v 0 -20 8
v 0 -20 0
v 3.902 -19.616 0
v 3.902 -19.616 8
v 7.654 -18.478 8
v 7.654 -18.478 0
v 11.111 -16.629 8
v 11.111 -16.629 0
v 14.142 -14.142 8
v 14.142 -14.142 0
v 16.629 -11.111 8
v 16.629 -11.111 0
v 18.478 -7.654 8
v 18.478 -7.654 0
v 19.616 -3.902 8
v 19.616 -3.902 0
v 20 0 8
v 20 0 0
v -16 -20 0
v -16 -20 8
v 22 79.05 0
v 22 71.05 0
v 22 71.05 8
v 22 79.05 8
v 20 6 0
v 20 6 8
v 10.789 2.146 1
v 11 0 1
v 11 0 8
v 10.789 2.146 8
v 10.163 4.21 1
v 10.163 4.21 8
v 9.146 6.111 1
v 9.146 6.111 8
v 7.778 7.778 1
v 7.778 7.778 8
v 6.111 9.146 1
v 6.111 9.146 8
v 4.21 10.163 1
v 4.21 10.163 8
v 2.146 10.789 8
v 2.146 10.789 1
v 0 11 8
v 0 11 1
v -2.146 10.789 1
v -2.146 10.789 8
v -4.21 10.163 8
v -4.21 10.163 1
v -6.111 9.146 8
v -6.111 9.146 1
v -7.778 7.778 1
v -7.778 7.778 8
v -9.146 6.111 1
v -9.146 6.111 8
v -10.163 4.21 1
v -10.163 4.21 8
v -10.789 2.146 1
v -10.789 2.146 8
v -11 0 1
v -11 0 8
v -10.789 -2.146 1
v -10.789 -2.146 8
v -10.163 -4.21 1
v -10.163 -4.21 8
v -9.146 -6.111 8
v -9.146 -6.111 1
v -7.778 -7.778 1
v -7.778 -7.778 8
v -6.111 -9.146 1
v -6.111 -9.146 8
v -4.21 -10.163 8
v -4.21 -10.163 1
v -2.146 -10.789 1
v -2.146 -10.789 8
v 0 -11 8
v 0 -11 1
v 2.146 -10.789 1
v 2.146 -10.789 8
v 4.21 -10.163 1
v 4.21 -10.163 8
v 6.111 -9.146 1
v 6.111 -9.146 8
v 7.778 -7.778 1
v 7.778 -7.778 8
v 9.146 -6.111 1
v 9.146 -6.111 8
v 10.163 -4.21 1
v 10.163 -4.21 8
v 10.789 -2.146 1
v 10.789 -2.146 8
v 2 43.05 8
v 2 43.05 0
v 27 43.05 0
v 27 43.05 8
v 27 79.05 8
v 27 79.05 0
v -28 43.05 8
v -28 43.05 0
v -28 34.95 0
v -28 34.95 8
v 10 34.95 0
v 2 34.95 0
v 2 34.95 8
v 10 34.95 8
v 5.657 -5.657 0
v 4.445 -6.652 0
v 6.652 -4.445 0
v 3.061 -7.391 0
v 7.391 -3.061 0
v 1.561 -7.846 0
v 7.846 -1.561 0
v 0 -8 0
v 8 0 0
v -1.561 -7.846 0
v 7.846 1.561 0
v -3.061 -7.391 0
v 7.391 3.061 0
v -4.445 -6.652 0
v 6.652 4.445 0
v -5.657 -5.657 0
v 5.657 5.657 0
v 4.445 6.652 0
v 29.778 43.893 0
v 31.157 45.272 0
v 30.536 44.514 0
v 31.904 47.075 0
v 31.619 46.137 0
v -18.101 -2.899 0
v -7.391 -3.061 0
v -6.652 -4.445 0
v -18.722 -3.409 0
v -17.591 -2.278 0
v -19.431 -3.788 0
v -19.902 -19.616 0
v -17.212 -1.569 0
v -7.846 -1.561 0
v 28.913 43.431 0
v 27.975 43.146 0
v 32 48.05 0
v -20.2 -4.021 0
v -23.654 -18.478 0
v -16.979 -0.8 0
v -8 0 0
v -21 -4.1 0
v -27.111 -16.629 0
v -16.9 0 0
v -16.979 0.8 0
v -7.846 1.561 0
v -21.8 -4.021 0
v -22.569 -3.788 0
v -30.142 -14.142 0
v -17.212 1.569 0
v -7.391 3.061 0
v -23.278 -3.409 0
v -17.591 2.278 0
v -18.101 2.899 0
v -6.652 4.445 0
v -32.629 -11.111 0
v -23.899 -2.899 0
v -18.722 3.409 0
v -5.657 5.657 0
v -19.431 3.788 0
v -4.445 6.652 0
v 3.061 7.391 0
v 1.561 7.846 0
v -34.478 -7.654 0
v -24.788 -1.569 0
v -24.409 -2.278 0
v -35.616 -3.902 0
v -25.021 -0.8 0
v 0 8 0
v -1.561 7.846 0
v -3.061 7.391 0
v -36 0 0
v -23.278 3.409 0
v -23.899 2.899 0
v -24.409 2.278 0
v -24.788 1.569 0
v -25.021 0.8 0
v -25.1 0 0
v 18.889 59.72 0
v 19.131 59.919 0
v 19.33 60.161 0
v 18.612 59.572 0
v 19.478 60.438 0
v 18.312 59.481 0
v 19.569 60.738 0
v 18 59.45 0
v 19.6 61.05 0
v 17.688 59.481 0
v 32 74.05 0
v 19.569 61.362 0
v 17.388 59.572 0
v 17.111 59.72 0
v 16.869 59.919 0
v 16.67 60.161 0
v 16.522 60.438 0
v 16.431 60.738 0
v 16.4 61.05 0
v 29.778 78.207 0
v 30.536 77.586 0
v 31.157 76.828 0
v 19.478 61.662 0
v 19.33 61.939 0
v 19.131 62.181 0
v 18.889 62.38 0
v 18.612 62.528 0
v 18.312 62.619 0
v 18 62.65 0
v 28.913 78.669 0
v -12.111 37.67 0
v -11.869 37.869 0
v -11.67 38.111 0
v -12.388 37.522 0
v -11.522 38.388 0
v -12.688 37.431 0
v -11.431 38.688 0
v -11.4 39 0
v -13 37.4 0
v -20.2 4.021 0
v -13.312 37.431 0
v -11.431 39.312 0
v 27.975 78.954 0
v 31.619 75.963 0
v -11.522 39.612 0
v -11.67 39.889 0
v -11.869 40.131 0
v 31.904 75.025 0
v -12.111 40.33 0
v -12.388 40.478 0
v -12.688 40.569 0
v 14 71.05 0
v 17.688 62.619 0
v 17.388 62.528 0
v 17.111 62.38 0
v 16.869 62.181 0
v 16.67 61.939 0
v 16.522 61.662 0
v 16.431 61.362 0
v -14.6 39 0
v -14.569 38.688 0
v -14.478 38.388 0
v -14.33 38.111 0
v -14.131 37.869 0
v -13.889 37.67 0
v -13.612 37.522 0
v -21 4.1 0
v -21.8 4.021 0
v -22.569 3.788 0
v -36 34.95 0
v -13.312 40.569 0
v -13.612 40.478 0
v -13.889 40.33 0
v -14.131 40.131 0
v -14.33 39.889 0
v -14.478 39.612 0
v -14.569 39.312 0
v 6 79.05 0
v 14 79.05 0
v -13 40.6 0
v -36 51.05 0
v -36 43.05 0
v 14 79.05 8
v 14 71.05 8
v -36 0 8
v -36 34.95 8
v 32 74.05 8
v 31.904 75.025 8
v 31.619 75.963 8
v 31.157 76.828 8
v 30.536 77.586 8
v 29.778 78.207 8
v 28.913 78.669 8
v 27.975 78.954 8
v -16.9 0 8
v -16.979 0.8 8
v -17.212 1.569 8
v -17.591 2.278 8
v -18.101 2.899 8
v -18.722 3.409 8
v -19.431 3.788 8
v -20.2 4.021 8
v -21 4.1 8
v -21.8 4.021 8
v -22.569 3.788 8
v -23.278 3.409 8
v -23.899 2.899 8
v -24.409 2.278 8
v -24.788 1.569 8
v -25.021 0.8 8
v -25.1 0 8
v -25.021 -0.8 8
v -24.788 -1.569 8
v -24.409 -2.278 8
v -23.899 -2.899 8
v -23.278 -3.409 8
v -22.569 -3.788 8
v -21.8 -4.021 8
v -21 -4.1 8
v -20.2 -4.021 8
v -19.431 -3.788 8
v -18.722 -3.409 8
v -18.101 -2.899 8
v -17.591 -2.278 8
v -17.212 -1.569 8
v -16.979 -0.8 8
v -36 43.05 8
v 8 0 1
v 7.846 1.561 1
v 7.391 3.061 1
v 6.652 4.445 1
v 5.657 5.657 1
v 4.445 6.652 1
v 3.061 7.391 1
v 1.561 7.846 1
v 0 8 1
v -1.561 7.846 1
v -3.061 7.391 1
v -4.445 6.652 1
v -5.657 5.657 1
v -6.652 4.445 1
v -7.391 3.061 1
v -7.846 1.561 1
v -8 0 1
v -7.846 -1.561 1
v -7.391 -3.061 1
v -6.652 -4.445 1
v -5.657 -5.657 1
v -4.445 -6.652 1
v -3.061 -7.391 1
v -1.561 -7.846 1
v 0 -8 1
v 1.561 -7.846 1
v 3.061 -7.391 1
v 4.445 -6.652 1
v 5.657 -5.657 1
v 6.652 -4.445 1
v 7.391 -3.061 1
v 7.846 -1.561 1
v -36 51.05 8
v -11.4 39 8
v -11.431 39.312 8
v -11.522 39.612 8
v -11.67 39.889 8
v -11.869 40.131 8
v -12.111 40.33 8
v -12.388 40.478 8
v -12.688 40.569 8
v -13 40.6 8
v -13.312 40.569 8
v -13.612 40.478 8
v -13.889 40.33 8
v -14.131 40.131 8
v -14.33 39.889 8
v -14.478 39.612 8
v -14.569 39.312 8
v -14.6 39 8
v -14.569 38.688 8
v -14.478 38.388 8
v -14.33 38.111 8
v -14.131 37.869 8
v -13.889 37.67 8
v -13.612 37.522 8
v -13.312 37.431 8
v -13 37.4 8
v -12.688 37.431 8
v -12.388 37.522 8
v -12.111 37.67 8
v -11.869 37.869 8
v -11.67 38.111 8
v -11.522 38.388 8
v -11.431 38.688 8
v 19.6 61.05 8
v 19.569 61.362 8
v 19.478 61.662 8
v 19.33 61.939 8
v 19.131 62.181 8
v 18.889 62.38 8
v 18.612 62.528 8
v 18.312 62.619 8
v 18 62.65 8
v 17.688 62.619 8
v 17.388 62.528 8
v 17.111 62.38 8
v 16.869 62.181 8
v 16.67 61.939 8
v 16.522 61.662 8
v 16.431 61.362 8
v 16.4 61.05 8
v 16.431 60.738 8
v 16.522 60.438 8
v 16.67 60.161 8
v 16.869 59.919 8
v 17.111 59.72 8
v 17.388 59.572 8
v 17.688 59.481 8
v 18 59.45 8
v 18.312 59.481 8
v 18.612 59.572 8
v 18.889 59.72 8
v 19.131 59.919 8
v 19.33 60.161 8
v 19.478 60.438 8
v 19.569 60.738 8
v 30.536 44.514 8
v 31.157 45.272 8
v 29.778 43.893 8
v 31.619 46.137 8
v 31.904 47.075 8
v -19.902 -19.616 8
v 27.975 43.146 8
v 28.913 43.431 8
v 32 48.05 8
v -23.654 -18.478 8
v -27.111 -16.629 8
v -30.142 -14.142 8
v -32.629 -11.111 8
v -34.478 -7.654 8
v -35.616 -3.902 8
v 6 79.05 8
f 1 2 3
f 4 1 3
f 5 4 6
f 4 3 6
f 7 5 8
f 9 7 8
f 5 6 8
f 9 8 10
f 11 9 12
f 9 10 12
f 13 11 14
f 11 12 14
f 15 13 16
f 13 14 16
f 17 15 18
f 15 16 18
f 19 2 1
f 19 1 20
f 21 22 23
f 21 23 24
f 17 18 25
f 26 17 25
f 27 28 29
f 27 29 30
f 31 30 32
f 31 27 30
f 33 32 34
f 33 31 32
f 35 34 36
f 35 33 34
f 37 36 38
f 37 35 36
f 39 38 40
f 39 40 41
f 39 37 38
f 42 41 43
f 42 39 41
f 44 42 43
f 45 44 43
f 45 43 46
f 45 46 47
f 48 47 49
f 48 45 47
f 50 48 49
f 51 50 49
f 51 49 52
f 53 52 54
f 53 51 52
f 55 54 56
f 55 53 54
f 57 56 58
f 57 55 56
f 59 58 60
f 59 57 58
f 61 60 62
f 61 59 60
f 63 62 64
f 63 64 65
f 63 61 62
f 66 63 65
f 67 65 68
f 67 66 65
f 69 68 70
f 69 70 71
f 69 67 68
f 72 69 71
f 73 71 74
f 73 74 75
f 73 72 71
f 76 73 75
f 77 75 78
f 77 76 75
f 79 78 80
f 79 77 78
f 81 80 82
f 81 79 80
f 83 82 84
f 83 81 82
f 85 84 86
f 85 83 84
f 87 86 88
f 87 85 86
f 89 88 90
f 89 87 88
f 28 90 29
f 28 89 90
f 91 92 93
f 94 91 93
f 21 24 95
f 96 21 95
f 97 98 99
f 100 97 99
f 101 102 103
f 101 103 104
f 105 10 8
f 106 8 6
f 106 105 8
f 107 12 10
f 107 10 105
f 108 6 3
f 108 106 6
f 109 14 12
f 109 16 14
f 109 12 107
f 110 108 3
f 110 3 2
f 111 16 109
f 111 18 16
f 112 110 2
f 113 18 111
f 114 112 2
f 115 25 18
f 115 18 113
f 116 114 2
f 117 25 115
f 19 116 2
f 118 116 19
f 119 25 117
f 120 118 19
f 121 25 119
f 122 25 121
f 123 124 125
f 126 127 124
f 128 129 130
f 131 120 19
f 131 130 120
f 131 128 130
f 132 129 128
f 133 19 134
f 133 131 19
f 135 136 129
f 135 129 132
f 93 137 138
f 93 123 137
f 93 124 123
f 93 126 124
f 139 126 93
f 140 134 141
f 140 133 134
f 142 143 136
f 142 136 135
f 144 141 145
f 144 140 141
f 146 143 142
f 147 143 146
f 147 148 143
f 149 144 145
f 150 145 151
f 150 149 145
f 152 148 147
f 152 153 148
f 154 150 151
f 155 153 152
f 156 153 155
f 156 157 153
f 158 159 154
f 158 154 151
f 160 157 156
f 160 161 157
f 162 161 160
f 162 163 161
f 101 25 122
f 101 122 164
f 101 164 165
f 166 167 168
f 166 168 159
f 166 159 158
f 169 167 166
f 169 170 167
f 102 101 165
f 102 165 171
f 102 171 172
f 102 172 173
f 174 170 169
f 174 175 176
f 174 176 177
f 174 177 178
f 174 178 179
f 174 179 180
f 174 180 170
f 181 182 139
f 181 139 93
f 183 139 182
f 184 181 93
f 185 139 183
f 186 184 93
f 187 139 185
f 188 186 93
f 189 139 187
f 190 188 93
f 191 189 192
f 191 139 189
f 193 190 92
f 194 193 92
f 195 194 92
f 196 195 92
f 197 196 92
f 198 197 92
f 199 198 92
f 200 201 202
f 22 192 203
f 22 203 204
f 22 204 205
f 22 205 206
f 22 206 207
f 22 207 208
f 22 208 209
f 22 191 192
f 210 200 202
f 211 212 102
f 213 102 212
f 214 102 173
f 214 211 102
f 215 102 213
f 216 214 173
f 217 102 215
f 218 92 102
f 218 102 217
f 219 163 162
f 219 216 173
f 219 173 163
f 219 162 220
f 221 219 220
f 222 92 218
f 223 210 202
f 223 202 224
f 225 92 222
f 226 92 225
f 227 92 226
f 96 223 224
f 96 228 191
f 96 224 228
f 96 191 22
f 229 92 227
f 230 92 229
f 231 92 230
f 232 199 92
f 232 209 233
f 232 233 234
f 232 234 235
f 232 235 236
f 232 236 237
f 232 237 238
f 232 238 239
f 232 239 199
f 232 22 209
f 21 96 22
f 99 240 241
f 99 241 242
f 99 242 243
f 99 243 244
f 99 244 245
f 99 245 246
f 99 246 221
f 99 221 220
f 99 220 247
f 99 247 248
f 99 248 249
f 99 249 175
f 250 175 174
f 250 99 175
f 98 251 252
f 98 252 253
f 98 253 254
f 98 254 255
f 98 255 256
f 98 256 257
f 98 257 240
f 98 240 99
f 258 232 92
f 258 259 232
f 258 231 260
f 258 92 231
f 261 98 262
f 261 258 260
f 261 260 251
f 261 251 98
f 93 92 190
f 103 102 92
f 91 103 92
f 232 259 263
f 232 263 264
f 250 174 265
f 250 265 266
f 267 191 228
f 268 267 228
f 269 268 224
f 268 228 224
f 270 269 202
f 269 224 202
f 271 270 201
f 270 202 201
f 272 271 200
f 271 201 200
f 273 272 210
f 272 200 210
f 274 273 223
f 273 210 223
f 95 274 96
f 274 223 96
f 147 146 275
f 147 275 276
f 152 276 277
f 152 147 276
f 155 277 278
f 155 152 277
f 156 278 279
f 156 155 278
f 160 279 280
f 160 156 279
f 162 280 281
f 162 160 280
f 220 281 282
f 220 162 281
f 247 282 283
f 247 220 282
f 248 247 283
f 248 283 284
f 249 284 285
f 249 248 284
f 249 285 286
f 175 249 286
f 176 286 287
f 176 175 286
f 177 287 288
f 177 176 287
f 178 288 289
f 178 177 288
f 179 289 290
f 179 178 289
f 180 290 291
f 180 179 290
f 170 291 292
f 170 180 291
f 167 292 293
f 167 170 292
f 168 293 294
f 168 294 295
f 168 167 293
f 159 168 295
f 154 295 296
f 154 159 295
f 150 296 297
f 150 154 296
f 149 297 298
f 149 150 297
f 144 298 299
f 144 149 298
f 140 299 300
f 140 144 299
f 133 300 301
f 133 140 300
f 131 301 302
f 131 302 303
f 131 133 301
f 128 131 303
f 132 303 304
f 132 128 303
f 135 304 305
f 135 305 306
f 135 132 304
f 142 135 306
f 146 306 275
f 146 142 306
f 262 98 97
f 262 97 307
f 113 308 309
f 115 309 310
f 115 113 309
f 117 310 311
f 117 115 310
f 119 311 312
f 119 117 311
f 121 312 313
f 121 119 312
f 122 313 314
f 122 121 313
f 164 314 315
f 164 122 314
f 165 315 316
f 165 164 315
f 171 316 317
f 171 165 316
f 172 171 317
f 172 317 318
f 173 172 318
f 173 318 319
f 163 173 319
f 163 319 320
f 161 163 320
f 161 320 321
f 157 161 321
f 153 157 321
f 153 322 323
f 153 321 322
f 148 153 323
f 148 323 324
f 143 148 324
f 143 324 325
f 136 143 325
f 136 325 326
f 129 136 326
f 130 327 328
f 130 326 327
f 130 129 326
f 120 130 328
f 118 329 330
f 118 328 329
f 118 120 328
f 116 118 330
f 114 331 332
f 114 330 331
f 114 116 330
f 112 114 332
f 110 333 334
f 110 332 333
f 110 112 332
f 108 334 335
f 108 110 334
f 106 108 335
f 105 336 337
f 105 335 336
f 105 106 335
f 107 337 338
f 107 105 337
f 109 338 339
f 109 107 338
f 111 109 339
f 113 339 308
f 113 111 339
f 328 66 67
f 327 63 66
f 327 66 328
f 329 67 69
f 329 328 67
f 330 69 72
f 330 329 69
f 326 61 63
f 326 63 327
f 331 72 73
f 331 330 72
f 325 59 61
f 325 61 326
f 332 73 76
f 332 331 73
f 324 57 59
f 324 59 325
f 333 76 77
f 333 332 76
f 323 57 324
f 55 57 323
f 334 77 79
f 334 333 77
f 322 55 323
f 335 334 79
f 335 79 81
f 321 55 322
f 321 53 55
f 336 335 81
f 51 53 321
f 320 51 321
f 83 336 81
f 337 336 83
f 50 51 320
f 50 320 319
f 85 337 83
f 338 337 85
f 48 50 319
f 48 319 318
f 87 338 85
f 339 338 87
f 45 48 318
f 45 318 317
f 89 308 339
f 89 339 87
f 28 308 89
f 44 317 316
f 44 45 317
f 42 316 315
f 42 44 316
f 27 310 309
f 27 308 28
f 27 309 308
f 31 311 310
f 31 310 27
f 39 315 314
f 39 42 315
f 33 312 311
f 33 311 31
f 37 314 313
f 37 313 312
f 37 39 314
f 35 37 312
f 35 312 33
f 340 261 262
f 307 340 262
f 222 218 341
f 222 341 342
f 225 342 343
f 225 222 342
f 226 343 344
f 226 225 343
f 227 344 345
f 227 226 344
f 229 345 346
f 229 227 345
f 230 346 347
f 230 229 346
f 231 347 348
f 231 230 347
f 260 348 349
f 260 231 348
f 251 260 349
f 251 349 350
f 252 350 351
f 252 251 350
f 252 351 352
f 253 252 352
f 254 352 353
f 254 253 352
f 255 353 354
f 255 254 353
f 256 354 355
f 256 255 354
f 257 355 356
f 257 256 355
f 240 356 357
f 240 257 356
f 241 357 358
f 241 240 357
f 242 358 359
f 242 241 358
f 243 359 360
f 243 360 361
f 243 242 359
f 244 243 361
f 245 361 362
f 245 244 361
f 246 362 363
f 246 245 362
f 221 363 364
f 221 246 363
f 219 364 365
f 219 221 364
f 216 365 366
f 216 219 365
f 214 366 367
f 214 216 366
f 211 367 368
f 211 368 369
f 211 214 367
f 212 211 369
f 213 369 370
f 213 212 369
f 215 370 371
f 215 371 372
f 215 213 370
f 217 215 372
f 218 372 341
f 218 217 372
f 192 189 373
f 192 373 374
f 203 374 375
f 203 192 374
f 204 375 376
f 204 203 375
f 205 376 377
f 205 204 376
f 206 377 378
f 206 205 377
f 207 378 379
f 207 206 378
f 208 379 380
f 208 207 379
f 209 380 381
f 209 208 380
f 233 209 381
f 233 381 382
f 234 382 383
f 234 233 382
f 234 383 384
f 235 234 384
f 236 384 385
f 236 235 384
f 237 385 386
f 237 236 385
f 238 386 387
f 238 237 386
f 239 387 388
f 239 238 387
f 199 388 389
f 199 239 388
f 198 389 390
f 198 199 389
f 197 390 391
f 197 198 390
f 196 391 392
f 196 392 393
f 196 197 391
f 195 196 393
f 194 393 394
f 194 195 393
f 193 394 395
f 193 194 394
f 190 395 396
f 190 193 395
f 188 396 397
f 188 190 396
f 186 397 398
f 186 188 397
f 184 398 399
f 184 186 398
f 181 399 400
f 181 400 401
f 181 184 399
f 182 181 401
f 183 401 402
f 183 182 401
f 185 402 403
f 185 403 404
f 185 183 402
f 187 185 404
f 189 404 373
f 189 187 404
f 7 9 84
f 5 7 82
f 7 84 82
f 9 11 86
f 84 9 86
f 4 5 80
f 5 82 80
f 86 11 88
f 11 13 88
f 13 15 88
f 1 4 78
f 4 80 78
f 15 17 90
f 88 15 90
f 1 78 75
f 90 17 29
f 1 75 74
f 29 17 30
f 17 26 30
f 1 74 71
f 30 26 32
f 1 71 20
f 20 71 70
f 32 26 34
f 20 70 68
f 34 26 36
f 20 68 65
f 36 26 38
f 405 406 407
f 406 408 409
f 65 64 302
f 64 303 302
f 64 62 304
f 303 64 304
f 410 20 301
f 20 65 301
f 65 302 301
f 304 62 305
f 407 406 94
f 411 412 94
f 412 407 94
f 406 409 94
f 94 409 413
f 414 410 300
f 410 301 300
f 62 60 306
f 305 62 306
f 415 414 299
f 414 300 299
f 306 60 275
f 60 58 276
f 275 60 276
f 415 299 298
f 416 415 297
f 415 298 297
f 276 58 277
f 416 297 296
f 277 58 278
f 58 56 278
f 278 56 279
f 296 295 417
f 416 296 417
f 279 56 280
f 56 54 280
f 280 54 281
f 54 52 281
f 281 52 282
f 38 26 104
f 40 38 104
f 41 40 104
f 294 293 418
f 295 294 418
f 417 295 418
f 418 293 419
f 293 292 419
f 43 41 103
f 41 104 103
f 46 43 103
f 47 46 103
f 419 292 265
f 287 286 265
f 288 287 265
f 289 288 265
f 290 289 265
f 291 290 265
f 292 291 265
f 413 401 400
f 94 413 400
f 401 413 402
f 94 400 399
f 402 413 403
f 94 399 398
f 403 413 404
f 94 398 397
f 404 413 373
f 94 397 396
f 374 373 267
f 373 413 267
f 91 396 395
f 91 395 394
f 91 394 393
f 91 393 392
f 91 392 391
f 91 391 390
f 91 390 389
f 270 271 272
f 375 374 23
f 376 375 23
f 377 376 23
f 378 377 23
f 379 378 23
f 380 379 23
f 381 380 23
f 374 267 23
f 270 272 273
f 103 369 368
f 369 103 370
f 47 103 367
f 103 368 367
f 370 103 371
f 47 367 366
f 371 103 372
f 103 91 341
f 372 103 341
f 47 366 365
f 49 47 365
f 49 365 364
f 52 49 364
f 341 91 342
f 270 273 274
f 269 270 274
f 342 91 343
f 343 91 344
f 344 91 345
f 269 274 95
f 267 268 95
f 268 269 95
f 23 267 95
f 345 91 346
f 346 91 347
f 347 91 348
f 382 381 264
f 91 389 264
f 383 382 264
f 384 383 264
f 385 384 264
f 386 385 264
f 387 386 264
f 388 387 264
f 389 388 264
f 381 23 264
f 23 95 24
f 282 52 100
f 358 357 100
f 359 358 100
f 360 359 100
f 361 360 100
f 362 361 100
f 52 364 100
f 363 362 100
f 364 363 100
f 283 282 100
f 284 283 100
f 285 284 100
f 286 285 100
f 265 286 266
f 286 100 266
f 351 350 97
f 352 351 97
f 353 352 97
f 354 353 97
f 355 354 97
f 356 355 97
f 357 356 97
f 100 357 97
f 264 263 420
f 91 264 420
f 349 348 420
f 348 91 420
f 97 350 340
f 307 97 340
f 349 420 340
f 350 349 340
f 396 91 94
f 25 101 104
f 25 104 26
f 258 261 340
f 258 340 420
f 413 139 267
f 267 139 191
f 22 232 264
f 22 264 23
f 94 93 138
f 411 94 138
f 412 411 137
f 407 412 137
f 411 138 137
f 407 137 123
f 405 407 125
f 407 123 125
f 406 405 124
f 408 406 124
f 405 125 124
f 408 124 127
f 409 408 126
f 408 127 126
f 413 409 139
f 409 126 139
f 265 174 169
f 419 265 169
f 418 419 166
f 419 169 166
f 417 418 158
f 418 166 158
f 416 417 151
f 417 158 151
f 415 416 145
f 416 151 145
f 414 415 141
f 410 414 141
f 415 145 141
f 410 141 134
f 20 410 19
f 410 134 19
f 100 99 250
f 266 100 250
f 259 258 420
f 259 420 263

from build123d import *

# Parameters (mm, degrees)
CYLINDER_R     = 11
CYLINDER_DEPTH = 7
SKETCH_R       = 4.1
SKETCH_R_2     = 8
SKETCH_R_3     = 1.6
PAD_DEPTH      = 8


with BuildPart() as cylinder:
    # Cylinder → Cylinder (new body)
    with BuildSketch(Plane.XY.offset(1)):
        Circle(CYLINDER_R)
    extrude(amount=CYLINDER_DEPTH)


with BuildPart() as cut:
    # Sketch → Pad (new body)
    with BuildSketch(Plane.XY):
        with BuildLine():
            Line((1e-06, -20), (-16, -20))
            ThreePointArc((-36, 0), (-30.142135, -14.142136), (-16, -20))
            Line((-36, 0), (-36, 34.95))
            Line((-28, 34.95), (-36, 34.95))
            Line((-28, 39), (-28, 34.95))
            Line((-28, 39), (-28, 43.05))
            Line((-28, 43.05), (-36, 43.05))
            Line((-36, 51.05), (-36, 43.05))
            Line((-36, 51.05), (6, 79.05))
            Line((6, 79.05), (14, 79.05))
            Line((14, 79.05), (14, 71.05))
            Line((14, 71.05), (18, 71.05))
            Line((18, 71.05), (22, 71.05))
            Line((22, 71.05), (22, 79.05))
            Line((22, 79.05), (27, 79.05))
            ThreePointArc((32, 74.05), (30.535534, 77.585534), (27, 79.05))
            Line((32, 48.05), (32, 74.05))
            ThreePointArc((27, 43.05), (30.535534, 44.514466), (32, 48.05))
            Line((2, 43.05), (27, 43.05))
            Line((2, 39), (2, 43.05))
            Line((2, 34.95), (2, 39))
            Line((2, 34.95), (10, 34.95))
            Line((10, 34.95), (20, 6))
            Line((20, 0), (20, 6))
            ThreePointArc((1e-06, -20), (14.142136, -14.142136), (20, 0))
        make_face()
        with Locations((-21, 0)):
            Circle(SKETCH_R, mode=Mode.SUBTRACT)
        with Locations((0, 0)):
            Circle(SKETCH_R_2, mode=Mode.SUBTRACT)
        with Locations((-13, 39)):
            Circle(SKETCH_R_3, mode=Mode.SUBTRACT)
        with Locations((18, 61.05)):
            Circle(SKETCH_R_3, mode=Mode.SUBTRACT)
    extrude(amount=PAD_DEPTH)

    # Cut: cut Cylinder
    add(cylinder.part, mode=Mode.SUBTRACT)


solid = cut.part
